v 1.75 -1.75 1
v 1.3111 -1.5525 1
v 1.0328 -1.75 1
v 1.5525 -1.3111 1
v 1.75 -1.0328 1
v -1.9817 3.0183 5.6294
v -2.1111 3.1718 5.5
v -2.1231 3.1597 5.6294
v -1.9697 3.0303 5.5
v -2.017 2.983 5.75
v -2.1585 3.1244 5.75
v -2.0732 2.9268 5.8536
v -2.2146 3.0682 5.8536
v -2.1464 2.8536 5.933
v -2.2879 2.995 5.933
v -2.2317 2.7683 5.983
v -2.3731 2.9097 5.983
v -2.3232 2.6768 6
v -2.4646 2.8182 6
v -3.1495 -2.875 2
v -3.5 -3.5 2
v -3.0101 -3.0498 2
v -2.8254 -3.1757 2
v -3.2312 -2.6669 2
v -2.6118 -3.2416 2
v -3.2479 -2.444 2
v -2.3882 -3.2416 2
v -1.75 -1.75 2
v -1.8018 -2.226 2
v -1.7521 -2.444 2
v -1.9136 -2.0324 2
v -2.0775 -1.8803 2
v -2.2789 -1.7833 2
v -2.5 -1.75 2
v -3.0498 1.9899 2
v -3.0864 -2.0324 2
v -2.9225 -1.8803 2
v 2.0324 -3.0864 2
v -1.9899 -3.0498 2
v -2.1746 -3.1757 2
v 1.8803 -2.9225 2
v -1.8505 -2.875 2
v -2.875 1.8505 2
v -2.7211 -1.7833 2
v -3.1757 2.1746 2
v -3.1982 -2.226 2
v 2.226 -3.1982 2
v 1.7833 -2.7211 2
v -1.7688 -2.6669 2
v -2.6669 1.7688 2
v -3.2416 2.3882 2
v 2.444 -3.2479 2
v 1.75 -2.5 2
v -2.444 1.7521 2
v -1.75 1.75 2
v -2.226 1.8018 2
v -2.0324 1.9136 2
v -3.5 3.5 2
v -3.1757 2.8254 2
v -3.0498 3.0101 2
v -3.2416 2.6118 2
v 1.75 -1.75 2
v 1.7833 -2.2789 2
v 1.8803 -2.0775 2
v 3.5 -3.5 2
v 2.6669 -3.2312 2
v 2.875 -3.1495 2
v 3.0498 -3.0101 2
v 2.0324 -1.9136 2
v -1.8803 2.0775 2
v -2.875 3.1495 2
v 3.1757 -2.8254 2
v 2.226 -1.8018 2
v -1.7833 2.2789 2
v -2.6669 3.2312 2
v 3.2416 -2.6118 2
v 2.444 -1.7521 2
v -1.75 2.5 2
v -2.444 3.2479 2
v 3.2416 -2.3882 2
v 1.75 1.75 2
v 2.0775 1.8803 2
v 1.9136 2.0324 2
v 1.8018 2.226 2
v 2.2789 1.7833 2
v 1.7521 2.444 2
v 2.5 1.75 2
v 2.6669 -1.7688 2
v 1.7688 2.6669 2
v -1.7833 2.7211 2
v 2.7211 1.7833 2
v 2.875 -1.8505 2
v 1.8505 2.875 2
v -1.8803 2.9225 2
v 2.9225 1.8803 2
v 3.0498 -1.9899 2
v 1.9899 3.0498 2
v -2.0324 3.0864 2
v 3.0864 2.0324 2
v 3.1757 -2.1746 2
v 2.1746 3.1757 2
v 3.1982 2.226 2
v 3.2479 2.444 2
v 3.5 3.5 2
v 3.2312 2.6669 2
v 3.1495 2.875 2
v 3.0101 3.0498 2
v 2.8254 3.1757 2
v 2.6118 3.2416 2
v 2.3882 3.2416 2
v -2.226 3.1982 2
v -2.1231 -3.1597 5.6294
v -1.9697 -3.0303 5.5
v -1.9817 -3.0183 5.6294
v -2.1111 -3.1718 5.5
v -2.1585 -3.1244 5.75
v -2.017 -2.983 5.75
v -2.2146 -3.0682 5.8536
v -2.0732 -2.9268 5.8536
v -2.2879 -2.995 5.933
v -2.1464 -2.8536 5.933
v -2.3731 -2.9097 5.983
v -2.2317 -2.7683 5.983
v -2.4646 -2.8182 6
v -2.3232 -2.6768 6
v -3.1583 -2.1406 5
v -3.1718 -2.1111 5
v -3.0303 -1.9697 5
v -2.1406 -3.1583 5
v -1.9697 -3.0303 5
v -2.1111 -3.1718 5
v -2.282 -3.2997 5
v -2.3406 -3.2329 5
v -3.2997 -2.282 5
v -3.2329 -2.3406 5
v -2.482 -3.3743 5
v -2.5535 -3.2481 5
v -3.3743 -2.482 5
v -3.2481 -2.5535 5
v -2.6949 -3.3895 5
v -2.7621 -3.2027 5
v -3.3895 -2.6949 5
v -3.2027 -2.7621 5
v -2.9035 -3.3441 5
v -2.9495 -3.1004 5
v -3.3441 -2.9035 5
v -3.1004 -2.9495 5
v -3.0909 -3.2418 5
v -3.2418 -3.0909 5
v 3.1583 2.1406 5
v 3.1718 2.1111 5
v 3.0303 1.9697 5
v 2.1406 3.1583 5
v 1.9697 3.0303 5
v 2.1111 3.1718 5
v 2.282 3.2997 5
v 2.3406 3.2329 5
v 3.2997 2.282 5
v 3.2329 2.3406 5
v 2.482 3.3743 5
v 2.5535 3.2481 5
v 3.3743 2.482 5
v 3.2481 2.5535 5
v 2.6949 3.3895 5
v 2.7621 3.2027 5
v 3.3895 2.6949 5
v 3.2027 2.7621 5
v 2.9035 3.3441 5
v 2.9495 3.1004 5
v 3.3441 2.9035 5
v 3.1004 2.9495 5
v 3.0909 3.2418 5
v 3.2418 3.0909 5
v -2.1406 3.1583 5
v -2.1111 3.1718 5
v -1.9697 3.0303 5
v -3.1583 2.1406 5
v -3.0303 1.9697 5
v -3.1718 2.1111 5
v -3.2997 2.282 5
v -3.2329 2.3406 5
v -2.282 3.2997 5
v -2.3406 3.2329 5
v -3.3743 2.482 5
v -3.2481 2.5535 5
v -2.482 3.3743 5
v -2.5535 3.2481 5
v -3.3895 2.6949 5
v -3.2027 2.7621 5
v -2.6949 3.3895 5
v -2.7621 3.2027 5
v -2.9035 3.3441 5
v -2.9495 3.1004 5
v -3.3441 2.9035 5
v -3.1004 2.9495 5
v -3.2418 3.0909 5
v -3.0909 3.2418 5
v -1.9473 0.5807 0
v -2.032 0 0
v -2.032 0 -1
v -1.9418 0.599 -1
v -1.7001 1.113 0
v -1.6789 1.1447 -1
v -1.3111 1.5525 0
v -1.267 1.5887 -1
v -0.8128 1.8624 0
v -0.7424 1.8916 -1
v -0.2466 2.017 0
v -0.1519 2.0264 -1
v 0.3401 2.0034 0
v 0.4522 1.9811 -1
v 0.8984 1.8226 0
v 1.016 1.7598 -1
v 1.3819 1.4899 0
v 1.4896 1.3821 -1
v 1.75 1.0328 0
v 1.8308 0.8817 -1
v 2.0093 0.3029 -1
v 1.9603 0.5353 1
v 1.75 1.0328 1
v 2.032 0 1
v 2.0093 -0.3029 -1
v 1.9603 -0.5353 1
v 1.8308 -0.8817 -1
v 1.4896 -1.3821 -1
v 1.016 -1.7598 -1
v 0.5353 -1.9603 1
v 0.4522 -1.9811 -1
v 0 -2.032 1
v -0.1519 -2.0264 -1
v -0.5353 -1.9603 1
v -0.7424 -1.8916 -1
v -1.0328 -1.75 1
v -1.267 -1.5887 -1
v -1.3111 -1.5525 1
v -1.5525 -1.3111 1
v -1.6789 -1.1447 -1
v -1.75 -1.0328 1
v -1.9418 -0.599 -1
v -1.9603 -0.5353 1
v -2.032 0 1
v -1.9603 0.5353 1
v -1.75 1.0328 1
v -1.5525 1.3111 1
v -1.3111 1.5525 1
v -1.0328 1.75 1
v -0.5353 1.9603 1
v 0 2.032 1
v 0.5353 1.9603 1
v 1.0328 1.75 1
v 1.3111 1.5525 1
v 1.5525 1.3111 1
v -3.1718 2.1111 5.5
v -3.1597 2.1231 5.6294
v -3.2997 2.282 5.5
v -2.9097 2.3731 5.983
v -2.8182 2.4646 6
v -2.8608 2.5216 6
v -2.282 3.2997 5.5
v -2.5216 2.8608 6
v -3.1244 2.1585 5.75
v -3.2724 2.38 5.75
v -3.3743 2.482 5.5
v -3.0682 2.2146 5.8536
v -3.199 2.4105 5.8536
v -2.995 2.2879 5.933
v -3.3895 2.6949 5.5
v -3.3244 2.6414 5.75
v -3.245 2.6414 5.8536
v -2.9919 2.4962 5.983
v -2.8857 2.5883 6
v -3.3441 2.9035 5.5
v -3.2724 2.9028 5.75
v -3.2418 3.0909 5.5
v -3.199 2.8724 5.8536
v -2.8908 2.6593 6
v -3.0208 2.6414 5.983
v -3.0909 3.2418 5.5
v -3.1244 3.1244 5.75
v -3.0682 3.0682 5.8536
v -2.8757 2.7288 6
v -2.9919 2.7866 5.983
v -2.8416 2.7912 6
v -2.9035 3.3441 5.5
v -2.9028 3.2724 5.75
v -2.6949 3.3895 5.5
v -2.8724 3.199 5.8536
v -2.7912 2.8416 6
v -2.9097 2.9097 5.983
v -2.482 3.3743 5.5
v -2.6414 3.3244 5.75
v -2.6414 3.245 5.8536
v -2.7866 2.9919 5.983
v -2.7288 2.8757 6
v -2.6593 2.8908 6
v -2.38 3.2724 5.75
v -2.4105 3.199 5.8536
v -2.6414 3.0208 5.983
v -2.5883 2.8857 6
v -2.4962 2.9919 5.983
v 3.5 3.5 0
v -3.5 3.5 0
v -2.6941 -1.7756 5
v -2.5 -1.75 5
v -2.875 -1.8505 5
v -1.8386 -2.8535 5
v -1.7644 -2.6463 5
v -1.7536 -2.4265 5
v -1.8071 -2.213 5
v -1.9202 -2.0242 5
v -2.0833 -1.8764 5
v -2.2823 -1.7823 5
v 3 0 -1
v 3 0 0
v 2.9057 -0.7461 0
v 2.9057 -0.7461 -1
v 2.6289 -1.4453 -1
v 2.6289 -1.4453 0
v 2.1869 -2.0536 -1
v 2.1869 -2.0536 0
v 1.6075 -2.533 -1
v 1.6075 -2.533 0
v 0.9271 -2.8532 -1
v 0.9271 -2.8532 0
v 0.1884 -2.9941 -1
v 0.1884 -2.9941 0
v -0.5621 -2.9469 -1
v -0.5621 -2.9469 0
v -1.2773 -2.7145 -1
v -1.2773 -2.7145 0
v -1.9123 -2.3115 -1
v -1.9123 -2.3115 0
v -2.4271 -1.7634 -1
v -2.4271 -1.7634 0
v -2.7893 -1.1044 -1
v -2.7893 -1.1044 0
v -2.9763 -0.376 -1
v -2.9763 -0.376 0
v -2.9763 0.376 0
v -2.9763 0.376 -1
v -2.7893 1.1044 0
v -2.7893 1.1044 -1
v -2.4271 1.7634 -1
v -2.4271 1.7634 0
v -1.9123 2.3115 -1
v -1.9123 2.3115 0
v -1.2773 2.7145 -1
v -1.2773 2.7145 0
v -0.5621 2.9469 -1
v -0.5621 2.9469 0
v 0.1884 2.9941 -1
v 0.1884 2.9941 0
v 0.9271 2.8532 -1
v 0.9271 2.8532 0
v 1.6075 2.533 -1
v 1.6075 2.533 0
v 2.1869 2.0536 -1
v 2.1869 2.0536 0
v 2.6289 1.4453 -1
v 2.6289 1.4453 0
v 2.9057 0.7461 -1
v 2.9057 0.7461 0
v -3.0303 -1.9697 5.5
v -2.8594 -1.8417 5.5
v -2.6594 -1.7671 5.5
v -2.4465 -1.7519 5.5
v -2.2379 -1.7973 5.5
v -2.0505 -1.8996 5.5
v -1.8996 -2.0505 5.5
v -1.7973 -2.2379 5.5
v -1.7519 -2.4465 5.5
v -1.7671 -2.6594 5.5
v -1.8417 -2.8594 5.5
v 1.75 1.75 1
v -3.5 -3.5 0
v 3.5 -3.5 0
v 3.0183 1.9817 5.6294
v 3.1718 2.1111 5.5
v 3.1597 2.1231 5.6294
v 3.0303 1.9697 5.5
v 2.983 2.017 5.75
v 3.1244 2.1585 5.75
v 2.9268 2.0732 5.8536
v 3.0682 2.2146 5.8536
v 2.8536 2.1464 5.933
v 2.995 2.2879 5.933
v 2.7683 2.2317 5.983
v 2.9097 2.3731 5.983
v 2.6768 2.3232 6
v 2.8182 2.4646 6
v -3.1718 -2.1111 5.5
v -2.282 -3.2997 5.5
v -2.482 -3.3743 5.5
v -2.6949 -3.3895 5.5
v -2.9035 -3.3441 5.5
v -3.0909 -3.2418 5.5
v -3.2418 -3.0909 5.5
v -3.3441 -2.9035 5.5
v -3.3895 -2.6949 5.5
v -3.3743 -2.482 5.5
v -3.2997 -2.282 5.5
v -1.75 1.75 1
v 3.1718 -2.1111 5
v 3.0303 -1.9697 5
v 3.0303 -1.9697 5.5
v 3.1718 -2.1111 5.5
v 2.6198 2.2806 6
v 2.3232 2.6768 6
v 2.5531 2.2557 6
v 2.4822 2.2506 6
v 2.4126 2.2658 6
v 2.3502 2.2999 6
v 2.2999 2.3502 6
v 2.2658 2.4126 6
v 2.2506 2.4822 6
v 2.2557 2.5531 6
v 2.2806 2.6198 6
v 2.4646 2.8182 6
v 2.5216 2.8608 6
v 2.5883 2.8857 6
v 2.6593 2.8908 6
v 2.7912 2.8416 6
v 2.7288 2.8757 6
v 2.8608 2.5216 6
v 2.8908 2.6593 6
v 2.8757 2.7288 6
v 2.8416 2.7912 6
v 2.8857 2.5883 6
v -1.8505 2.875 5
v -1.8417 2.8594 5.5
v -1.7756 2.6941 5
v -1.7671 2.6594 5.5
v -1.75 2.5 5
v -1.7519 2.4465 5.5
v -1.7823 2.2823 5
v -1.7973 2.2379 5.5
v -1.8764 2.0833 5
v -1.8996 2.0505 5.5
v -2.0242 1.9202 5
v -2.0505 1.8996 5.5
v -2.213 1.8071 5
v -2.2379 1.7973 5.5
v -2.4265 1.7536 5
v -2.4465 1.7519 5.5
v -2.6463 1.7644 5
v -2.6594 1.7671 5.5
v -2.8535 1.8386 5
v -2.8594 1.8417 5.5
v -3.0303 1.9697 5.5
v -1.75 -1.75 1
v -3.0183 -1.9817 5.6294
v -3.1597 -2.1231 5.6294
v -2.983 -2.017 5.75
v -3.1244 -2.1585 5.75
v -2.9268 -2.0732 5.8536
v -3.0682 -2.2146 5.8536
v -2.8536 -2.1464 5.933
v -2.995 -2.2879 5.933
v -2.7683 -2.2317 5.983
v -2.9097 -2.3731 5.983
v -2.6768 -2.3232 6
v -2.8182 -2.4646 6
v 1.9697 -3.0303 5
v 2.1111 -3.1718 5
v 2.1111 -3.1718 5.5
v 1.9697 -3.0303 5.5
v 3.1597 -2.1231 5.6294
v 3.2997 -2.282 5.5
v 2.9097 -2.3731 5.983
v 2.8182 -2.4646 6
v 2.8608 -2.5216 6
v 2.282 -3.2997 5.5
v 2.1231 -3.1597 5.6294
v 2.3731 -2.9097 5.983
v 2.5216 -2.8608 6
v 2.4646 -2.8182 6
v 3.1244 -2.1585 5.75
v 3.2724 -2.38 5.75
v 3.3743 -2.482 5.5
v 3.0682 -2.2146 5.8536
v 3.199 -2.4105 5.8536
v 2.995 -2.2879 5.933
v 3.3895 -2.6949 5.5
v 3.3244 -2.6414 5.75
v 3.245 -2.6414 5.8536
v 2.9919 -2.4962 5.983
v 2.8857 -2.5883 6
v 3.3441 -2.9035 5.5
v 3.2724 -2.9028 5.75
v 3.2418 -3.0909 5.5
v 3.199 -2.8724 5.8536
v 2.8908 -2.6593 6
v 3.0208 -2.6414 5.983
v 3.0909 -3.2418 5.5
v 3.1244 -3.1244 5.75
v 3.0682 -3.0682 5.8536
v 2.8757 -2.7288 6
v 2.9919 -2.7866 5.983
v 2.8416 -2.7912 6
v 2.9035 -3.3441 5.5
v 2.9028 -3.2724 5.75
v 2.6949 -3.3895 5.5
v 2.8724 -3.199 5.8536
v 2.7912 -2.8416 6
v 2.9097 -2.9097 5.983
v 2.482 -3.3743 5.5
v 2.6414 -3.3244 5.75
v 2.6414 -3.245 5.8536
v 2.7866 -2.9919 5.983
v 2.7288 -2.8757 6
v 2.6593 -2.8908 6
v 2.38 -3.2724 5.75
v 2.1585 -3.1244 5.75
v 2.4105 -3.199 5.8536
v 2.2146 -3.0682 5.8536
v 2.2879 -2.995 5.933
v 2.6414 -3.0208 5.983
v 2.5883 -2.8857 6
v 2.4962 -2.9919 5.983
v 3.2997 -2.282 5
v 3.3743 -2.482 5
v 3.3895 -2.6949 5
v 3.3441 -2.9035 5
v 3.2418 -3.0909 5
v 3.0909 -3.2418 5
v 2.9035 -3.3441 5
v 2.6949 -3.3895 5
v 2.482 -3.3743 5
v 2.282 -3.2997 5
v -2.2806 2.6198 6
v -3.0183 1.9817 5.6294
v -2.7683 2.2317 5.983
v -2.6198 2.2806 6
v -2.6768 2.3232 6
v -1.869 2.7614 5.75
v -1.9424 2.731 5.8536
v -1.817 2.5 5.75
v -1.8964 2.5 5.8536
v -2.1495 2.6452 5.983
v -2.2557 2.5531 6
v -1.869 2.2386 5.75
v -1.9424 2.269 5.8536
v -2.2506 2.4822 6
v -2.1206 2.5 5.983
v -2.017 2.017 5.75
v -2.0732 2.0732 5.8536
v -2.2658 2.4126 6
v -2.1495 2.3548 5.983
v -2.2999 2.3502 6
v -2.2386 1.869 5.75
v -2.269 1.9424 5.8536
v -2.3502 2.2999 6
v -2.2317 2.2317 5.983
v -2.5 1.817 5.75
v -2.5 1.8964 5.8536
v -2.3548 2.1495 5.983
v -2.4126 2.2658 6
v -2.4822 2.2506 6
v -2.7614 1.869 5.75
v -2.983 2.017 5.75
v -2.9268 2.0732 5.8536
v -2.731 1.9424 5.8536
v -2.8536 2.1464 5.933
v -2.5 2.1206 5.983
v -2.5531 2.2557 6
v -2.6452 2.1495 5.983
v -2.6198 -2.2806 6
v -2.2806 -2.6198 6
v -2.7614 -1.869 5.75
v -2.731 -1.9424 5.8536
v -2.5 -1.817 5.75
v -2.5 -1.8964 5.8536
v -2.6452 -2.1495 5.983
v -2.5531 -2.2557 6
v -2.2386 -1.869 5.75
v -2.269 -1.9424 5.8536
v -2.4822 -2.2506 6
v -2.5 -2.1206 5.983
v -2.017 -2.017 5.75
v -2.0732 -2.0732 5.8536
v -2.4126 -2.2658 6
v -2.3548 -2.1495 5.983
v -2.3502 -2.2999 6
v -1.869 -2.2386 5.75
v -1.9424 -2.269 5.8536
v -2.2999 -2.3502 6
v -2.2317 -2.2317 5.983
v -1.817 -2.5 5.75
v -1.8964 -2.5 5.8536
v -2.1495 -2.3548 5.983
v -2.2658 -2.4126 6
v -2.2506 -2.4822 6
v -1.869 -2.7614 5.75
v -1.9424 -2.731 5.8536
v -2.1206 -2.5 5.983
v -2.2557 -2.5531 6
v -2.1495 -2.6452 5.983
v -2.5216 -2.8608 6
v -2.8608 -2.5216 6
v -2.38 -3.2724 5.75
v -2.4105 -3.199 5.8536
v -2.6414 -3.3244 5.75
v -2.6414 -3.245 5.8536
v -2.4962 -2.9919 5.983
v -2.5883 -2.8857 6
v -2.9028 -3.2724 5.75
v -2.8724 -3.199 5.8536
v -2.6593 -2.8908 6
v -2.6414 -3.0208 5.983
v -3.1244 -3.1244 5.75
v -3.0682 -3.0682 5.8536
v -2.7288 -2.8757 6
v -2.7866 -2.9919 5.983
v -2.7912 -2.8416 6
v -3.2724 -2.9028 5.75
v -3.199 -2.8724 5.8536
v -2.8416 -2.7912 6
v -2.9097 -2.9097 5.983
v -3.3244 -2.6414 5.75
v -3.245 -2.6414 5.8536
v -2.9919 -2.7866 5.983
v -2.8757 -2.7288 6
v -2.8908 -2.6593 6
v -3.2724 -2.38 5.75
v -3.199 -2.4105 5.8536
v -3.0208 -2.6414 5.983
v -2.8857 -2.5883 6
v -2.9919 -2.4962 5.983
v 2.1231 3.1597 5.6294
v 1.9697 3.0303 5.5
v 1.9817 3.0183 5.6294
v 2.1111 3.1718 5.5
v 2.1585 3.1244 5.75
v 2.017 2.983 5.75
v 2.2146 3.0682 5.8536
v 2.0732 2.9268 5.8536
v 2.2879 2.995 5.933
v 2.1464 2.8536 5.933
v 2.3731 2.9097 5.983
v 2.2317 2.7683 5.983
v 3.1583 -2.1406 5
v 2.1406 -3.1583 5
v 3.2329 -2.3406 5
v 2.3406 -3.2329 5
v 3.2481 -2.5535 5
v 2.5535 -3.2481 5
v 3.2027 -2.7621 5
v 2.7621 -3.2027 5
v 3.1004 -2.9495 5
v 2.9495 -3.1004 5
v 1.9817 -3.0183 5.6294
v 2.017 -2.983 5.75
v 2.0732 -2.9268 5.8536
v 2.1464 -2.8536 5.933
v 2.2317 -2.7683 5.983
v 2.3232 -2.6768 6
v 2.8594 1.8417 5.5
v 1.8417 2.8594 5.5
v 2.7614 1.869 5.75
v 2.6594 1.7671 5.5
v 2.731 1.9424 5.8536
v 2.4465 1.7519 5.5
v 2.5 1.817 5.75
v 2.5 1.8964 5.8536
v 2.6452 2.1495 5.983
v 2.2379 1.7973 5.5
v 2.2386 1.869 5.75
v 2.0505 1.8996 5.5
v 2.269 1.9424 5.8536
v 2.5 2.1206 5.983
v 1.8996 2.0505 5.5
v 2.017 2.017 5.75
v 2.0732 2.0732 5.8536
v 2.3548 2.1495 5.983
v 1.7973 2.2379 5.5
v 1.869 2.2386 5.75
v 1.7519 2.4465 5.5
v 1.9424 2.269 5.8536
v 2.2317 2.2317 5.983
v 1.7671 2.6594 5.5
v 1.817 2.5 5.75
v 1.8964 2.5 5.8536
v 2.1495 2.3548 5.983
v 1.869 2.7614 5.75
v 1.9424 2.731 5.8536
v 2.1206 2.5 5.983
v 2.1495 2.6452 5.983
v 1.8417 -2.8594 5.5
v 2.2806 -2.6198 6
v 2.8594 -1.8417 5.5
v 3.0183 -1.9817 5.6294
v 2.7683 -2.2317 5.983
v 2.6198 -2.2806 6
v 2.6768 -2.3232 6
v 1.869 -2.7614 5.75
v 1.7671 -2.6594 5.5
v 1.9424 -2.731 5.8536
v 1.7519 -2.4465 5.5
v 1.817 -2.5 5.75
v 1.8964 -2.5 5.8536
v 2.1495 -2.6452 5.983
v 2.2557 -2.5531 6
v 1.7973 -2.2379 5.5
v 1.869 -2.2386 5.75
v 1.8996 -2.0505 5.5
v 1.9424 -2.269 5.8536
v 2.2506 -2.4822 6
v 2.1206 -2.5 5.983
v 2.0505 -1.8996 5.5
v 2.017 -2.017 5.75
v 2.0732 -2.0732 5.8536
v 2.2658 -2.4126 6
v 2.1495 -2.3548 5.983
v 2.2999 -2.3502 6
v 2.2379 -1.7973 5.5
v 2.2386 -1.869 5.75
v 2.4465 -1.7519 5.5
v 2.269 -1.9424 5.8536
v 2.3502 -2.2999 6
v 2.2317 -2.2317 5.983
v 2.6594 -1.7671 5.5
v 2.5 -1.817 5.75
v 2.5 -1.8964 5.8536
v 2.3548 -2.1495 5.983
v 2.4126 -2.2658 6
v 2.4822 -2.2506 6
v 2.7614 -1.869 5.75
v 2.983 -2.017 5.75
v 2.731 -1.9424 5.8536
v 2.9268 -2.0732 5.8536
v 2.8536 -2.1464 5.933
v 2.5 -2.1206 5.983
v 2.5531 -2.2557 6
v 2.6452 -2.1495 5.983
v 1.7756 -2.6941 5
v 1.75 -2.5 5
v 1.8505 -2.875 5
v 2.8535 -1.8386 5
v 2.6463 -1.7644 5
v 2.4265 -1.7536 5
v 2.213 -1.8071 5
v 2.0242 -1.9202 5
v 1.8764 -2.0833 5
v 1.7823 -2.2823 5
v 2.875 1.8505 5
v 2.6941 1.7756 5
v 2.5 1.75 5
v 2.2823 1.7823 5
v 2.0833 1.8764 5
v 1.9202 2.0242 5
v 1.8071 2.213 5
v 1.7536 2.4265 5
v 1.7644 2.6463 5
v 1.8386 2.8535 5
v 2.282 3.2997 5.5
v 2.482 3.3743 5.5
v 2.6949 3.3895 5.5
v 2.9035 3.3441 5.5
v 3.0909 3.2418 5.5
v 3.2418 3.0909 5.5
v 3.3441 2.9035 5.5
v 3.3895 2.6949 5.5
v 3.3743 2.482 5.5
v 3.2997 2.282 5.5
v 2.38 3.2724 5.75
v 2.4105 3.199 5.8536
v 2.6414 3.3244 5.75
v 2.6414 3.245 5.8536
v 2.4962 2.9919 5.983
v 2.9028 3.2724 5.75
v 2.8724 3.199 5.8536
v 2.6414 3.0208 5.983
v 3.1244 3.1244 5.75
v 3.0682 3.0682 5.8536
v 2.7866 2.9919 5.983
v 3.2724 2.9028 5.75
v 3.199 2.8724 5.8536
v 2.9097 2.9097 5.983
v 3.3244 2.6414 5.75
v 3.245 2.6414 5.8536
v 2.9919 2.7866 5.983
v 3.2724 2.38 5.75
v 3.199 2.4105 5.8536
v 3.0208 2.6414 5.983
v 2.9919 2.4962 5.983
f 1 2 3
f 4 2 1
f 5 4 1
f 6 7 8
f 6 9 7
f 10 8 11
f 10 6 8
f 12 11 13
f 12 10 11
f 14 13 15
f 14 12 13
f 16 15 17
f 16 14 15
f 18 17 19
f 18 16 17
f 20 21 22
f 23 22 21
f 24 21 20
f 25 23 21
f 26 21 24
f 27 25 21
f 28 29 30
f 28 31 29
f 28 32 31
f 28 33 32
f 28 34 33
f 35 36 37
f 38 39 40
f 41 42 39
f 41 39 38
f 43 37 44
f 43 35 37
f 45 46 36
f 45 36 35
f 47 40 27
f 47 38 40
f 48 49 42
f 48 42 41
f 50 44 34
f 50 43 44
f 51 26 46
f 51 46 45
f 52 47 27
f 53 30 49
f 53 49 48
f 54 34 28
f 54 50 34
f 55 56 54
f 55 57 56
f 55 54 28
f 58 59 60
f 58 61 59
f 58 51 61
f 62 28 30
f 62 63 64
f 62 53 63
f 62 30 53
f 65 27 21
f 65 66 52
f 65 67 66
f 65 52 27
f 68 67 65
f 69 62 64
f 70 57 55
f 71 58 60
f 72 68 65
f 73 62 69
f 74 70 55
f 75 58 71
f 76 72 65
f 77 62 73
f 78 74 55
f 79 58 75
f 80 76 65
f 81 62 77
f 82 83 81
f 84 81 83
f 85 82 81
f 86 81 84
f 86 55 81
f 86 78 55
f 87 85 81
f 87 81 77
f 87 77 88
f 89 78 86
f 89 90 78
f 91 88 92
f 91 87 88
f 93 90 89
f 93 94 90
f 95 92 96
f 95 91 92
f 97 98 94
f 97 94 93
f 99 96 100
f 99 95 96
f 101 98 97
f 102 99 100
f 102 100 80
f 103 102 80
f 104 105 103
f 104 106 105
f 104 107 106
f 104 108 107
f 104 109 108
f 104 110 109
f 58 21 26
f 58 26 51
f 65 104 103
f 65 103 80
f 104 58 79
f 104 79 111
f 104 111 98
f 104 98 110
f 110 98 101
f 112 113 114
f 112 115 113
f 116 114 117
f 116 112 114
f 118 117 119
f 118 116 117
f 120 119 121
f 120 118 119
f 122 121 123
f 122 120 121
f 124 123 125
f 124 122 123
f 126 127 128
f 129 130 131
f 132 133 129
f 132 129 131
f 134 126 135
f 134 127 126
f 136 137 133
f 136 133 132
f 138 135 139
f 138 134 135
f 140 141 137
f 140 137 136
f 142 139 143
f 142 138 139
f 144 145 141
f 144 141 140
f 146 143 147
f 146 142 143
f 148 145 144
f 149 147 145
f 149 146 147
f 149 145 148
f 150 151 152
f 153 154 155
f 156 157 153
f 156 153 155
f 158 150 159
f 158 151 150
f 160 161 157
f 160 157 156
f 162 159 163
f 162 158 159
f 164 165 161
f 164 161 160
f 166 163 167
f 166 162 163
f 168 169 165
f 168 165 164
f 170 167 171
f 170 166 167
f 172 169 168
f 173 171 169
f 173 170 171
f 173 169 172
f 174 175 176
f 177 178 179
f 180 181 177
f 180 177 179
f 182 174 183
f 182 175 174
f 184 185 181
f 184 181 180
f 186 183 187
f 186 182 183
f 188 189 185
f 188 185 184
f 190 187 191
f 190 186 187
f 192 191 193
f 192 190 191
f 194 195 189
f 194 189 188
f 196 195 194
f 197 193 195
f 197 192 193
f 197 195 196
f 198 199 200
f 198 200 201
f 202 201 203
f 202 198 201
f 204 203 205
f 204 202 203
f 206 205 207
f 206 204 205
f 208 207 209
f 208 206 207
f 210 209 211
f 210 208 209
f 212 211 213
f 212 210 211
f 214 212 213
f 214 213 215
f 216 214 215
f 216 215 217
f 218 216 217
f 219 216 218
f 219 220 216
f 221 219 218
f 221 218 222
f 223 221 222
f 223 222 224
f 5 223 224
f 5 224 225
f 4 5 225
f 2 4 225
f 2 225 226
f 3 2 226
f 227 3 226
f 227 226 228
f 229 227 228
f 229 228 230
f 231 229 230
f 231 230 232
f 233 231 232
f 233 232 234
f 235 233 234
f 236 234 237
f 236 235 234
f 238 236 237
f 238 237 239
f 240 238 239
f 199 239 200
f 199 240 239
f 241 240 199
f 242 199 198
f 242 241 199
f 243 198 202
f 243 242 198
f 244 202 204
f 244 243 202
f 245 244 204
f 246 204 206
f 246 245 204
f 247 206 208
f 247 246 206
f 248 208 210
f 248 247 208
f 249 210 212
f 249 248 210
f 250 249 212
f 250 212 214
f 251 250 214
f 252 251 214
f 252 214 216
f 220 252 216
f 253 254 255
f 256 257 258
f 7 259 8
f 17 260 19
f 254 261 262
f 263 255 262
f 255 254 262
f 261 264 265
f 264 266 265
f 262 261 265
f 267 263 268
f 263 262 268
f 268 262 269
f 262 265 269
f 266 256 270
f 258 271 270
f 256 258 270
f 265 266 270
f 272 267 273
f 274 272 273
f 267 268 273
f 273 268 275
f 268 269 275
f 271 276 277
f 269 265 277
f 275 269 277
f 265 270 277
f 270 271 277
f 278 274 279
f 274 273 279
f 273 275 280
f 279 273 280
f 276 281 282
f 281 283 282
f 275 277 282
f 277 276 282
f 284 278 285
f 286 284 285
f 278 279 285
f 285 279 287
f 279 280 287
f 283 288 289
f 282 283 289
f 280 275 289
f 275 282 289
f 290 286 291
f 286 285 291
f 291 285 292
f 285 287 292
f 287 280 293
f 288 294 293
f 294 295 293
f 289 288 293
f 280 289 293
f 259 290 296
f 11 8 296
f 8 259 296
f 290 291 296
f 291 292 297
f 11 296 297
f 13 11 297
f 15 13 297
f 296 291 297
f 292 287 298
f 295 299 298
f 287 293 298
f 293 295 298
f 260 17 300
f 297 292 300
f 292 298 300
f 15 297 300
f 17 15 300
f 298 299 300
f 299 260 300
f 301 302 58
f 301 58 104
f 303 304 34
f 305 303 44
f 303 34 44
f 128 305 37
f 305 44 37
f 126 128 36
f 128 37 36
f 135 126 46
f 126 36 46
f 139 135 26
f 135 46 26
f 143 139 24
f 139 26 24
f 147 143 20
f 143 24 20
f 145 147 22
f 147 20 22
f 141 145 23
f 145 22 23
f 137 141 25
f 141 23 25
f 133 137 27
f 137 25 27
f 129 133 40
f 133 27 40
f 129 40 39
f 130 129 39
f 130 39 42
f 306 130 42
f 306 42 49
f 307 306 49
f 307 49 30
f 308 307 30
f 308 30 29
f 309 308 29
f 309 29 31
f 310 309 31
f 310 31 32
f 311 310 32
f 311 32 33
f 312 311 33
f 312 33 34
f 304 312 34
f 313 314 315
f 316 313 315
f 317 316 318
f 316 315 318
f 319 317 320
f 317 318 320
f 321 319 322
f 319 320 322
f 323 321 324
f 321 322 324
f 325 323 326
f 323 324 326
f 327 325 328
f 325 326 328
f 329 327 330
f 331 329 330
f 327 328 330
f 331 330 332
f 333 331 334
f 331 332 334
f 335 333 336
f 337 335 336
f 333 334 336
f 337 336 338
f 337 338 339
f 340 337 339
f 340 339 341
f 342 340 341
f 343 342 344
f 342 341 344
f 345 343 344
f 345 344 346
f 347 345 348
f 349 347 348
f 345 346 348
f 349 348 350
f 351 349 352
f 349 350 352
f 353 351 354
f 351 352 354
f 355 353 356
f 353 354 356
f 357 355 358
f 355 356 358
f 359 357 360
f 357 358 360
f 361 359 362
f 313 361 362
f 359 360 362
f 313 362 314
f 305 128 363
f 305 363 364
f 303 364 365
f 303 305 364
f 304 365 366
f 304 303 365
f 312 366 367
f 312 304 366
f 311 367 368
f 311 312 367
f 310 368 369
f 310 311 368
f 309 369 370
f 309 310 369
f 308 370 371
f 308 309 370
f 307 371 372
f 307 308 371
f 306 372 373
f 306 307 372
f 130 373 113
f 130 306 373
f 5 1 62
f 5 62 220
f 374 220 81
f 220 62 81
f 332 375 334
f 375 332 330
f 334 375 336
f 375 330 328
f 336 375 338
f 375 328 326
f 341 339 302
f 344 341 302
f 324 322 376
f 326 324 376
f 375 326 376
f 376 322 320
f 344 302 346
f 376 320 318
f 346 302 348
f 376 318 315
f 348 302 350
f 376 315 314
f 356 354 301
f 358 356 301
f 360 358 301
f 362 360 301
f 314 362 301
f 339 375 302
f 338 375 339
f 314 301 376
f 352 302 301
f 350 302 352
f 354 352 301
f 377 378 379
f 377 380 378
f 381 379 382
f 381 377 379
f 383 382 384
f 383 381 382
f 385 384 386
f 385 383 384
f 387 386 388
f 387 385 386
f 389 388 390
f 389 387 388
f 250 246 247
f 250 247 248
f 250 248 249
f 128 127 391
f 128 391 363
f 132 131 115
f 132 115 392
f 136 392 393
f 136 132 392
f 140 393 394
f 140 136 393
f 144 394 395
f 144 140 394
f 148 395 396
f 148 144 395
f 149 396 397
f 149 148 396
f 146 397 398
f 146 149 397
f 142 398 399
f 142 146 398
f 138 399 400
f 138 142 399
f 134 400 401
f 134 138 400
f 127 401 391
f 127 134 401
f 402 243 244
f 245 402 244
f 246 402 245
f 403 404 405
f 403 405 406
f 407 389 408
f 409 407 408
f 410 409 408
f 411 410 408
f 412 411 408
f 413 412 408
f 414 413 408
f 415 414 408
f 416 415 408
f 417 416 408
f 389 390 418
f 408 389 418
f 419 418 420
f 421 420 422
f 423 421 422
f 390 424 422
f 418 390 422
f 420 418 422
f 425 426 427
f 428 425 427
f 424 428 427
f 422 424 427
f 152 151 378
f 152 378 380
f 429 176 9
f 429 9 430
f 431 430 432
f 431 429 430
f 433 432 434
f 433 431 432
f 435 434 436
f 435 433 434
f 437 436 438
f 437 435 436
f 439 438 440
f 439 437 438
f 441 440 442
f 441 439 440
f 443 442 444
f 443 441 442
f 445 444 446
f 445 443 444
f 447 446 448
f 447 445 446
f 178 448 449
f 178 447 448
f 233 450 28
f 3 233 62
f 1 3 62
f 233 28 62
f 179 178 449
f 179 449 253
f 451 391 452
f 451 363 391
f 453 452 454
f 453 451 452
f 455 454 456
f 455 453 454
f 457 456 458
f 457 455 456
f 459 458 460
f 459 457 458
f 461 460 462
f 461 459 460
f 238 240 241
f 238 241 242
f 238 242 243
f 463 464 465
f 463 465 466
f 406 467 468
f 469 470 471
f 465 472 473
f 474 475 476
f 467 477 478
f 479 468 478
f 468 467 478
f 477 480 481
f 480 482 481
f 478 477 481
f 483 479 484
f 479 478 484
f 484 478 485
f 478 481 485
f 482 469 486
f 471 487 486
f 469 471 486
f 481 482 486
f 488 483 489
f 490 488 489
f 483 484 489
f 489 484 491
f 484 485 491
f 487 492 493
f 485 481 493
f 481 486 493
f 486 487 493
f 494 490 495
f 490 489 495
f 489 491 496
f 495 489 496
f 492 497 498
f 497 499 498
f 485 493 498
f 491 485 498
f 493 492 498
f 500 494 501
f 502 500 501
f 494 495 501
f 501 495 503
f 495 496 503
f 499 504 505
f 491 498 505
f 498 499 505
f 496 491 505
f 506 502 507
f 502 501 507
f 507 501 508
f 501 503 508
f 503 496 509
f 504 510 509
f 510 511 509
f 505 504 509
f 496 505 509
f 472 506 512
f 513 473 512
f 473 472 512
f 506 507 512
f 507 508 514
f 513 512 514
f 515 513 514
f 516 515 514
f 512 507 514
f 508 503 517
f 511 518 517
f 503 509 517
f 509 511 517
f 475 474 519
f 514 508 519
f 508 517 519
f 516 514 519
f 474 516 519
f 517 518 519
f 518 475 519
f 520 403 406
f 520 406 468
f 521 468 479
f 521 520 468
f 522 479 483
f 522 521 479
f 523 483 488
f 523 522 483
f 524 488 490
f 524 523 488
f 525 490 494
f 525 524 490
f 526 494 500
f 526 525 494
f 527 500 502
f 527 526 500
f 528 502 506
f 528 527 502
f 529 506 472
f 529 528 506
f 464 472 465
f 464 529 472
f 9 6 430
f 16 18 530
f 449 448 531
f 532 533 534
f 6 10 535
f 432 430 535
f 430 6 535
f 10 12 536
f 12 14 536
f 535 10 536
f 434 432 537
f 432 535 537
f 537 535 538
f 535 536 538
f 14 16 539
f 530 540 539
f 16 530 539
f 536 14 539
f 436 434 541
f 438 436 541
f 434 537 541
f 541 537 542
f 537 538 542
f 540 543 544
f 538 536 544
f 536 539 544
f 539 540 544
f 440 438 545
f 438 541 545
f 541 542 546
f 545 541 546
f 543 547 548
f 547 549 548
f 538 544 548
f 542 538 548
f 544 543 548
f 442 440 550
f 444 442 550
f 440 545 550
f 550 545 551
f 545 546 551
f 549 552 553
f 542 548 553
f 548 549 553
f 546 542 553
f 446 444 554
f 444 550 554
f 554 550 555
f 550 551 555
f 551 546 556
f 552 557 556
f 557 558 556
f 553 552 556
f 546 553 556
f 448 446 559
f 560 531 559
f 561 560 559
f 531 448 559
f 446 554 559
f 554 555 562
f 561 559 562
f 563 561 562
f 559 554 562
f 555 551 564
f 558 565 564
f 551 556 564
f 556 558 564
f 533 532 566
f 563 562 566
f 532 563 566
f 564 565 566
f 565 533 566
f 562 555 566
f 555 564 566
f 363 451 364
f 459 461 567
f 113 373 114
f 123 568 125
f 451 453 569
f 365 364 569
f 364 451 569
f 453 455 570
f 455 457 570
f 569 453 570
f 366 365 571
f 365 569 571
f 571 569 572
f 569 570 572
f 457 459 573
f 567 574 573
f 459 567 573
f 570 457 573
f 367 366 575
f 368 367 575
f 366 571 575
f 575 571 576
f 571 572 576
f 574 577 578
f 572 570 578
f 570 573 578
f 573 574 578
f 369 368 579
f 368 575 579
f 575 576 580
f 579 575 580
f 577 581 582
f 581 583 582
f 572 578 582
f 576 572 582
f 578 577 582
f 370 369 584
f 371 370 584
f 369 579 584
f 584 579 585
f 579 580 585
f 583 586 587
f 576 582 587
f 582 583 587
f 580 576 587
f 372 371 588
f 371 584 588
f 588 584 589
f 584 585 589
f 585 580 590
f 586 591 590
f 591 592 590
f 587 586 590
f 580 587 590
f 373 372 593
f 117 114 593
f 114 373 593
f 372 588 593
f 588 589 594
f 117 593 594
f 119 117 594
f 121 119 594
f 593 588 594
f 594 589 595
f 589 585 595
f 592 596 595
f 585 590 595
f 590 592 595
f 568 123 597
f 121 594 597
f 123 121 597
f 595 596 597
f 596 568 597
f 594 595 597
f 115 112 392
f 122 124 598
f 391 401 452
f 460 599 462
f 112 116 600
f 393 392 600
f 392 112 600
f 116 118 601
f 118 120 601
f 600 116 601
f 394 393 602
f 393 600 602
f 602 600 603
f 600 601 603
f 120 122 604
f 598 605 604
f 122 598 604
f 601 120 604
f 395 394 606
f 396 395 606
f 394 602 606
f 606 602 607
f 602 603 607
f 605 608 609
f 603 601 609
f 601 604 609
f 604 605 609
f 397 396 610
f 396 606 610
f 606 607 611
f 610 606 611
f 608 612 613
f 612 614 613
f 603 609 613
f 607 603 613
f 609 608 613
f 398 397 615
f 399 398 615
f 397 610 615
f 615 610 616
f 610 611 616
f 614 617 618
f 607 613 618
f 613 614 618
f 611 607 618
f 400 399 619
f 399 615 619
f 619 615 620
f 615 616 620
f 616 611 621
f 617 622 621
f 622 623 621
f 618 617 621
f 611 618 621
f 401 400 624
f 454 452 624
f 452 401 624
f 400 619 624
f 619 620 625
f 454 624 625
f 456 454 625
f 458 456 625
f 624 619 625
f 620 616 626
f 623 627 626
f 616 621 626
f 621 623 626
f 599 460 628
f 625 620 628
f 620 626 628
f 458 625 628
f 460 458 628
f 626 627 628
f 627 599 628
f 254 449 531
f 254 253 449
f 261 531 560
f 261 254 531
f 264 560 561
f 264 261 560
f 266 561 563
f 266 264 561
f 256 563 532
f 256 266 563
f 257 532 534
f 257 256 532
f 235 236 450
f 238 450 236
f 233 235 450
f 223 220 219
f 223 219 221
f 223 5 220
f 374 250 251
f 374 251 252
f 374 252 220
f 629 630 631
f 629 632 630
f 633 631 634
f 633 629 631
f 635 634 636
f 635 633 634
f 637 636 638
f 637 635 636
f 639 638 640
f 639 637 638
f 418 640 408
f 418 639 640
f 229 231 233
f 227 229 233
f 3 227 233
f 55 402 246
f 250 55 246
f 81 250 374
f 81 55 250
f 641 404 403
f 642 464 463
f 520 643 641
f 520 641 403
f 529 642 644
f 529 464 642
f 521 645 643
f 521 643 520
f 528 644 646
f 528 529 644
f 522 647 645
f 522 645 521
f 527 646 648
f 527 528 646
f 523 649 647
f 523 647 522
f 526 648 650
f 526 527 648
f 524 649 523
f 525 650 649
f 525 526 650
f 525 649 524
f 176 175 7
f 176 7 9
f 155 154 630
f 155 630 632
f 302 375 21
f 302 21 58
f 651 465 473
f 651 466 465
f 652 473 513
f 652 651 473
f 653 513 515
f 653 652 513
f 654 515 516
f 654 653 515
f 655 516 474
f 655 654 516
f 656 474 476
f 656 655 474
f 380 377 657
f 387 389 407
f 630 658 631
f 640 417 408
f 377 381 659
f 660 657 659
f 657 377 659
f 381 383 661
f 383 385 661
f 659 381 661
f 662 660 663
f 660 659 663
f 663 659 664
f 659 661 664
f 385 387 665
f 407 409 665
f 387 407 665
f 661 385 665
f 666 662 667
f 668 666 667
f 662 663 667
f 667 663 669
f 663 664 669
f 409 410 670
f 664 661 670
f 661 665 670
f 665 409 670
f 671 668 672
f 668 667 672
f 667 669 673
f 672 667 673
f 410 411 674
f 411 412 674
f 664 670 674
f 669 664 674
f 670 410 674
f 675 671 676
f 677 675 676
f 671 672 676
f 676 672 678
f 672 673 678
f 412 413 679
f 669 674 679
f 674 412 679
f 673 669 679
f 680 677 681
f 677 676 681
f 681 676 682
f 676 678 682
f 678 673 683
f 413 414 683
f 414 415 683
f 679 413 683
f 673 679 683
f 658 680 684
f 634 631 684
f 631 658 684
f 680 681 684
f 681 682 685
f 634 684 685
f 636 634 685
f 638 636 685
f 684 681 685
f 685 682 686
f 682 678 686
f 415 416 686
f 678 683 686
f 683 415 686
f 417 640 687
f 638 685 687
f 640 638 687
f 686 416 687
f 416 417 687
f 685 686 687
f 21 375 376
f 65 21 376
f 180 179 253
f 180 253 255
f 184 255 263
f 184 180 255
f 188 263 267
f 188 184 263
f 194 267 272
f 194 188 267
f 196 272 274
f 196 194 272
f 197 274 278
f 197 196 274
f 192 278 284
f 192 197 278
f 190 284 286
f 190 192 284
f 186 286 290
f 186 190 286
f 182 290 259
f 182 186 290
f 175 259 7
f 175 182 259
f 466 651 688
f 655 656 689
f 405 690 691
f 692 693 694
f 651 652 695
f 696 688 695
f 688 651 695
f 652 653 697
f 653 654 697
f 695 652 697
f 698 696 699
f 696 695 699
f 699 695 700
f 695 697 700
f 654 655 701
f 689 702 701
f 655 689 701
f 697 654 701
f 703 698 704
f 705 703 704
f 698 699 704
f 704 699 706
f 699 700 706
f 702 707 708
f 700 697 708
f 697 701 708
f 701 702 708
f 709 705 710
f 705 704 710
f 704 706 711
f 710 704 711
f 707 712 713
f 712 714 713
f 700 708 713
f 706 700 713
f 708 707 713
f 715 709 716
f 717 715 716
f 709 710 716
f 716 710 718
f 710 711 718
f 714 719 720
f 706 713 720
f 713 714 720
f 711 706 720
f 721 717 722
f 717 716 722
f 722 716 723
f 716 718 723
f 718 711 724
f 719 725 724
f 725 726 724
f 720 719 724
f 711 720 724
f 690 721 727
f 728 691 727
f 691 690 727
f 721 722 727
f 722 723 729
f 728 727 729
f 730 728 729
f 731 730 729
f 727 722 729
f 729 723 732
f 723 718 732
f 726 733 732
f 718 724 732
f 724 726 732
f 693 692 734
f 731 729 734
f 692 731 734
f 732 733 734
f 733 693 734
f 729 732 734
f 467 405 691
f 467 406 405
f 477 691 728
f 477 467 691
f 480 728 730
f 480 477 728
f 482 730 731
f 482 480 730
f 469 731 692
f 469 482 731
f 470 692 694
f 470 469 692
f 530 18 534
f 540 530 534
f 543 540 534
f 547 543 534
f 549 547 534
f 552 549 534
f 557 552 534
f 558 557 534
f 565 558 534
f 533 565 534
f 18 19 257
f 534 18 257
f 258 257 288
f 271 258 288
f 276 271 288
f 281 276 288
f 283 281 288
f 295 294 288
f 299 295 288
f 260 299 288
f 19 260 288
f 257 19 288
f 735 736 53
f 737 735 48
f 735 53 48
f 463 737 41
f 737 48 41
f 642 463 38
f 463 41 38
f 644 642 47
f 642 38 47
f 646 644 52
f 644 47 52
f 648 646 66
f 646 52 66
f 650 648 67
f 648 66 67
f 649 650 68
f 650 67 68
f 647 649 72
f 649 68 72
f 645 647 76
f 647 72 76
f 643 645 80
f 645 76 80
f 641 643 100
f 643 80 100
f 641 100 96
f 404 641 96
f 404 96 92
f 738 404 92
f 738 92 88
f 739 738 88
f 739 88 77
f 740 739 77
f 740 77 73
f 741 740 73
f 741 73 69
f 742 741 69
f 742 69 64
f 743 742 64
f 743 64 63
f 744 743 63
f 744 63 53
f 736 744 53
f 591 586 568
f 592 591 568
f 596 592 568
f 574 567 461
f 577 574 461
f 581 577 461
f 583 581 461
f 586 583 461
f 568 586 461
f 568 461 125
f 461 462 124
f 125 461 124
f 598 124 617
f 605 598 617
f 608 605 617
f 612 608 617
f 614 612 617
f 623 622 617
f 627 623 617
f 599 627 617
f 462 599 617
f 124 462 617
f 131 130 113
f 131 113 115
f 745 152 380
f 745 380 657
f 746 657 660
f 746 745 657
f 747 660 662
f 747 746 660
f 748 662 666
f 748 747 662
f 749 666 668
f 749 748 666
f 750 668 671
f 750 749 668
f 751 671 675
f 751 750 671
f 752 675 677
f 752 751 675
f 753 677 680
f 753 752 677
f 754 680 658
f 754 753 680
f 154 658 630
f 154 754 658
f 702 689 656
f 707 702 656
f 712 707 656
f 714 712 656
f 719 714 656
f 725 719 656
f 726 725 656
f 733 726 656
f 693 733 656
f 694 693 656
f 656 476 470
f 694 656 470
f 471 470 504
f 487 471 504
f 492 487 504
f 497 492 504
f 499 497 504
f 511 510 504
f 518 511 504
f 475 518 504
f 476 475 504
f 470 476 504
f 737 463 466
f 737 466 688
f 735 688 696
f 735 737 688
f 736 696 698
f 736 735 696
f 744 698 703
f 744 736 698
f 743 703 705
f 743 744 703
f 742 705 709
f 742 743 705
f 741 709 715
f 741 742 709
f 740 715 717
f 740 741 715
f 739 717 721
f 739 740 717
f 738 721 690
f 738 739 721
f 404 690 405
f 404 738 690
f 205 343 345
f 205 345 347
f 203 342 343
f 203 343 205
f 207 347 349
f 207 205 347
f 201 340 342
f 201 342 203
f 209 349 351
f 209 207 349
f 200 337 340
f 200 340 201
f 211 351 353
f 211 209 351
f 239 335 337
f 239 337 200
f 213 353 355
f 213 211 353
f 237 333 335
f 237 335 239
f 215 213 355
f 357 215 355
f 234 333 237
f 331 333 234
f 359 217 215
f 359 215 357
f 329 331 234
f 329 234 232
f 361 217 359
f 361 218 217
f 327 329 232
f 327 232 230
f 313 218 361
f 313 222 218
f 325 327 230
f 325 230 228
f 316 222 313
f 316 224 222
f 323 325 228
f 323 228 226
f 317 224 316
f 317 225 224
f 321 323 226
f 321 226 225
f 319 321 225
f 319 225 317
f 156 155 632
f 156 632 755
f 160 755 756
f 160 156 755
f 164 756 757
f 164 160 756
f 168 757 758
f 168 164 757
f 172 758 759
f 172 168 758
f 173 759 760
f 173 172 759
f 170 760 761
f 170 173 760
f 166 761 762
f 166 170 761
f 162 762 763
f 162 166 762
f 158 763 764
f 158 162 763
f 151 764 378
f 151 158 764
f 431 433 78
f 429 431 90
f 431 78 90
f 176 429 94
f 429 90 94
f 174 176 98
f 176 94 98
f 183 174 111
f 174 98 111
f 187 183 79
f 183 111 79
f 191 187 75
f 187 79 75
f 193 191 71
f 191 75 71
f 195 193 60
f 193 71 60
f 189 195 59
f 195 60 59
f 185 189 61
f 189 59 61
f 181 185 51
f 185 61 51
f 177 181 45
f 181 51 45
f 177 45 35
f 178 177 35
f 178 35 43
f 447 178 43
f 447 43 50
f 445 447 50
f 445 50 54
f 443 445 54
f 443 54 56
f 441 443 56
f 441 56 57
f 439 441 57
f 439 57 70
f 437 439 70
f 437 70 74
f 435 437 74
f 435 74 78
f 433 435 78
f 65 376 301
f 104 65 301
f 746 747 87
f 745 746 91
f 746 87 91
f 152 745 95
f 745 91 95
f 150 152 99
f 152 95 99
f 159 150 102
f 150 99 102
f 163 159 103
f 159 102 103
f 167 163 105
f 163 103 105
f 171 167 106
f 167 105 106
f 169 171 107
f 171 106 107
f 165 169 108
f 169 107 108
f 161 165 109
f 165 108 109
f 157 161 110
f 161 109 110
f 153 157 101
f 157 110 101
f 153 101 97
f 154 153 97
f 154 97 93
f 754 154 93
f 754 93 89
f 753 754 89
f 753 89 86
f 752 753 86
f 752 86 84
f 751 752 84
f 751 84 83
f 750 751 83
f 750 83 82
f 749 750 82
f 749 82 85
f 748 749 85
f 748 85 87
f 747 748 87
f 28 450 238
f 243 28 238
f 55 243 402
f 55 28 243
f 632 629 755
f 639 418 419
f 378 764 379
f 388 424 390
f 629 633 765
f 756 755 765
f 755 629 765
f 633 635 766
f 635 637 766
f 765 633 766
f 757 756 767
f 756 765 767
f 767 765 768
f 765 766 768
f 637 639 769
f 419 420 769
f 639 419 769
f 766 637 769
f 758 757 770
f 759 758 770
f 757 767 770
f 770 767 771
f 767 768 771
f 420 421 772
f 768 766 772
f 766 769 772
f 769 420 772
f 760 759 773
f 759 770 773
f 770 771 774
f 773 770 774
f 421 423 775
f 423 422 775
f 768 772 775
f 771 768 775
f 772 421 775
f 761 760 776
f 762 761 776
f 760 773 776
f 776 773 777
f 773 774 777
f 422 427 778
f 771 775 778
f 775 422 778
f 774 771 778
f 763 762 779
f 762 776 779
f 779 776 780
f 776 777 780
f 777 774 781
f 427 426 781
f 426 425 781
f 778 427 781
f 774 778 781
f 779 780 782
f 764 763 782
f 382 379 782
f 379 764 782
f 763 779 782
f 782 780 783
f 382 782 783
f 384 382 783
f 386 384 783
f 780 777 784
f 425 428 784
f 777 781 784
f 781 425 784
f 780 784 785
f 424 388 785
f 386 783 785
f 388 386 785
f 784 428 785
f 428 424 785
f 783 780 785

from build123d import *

# Parameters (mm, degrees)
ESQUISSE1_W                        = 7
ESQUISSE1_H                        = 7
BOSS_EXTRU_1_DEPTH                 = 2
ESQUISSE2_R                        = 3
ESQUISSE2_R_2                      = 2.032039
BOSS_EXTRU_2_DEPTH                 = 1
ESQUISSE3_R                        = 0.75
BOSS_EXTRU_3_DEPTH                 = 3
BOSS_EXTRU_4_DEPTH                 = 1
CONG_1_R                           = 0.5
R_P_TITION_CIRCULAIRE2_COUNT       = 4
CONG_1_OF_R_P_TITION_CIRCULAIRE2_R = 0.5
ESQUISSE6_W                        = 3.5
ESQUISSE6_H                        = 3.5
ENL_V_MAT_EXTRU_1_DEPTH            = 1
ENL_V_START                        = -1
ESQUISSE7_R                        = 2.032039
ENL_V_MAT_EXTRU_2_DEPTH            = 1


with BuildPart() as part:
    # Esquisse1 → Boss.-Extru.1 (new body)
    with BuildSketch(Plane.XY):
        Rectangle(ESQUISSE1_W, ESQUISSE1_H)
    extrude(amount=BOSS_EXTRU_1_DEPTH)

    # Esquisse2 → Boss.-Extru.2 (add)
    with BuildSketch(Plane(origin=(0, 0, 0), x_dir=(-1, 0, 0), z_dir=(0, 0, -1))):
        with Locations(Location((0, 0, 0), (0, 0, 180))):
            Circle(ESQUISSE2_R)
        Circle(ESQUISSE2_R_2, mode=Mode.SUBTRACT)
    extrude(amount=BOSS_EXTRU_2_DEPTH)

    # Esquisse3 → Boss.-Extru.3 (add)
    with BuildSketch(Plane(origin=(-0.00837, -0.443983, 2), x_dir=(1, 0, 0), z_dir=(0, 0, 1))):
        with Locations((-2.49163, 2.943983)):
            Circle(ESQUISSE3_R)
    boss_extru_3 = extrude(amount=BOSS_EXTRU_3_DEPTH)

    # Esquisse5 → Boss.-Extru.4 (add)
    with BuildSketch(Plane.XY.offset(5)):
        with BuildLine():
            Line((-3.03033, 1.96967), (-3.171751, 2.111091))
            ThreePointArc((-3.171751, 2.111091), (-3.171751, 3.171751), (-2.111091, 3.171751))
            Line((-2.111091, 3.171751), (-1.96967, 3.03033))
            ThreePointArc((-1.96967, 3.03033), (-1.96967, 1.96967), (-3.03033, 1.96967))
        make_face()
    boss_extru_4 = extrude(amount=BOSS_EXTRU_4_DEPTH)

    # Congé1
    cong_1_edges = [part.edges().sort_by_distance(p)[0] for p in [
        (-1.96967, 1.96967, 6),
        (-2.040381, 3.101041, 6),
        (-3.171751, 3.171751, 6),
        (-3.101041, 2.040381, 6),
    ]]
    fillet(cong_1_edges, radius=CONG_1_R)

    # Répétition circulaire2: Boss.-Extru.3, Boss.-Extru.4 ×4 about axis
    r_p_tition_circulaire2_axis = Axis((0, 0, 0), (0, 0, 1))
    add([boss_extru_3.rotate(r_p_tition_circulaire2_axis, i * 360 / R_P_TITION_CIRCULAIRE2_COUNT) for i in range(1, R_P_TITION_CIRCULAIRE2_COUNT)])
    add([boss_extru_4.rotate(r_p_tition_circulaire2_axis, i * 360 / R_P_TITION_CIRCULAIRE2_COUNT) for i in range(1, R_P_TITION_CIRCULAIRE2_COUNT)])

    # Congé1 of Répétition circulaire2
    cong_1_of_r_p_tition_circulaire2_edges = [part.edges().sort_by_distance(p)[0] for p in [
        (-1.96967, -1.96967, 6),
        (-3.101041, -2.040381, 6),
        (-3.171751, -3.171751, 6),
        (-2.040381, -3.101041, 6),
        (1.96967, -1.96967, 6),
        (2.040381, -3.101041, 6),
        (3.171751, -3.171751, 6),
        (3.101041, -2.040381, 6),
        (1.96967, 1.96967, 6),
        (3.101041, 2.040381, 6),
        (3.171751, 3.171751, 6),
        (2.040381, 3.101041, 6),
    ]]
    fillet(cong_1_of_r_p_tition_circulaire2_edges, radius=CONG_1_OF_R_P_TITION_CIRCULAIRE2_R)

    # Esquisse6 → Enlèv. mat.-Extru.1 (cut)
    with BuildSketch(Plane.XY.offset(2)):
        Rectangle(ESQUISSE6_W, ESQUISSE6_H)
    extrude(amount=-ENL_V_MAT_EXTRU_1_DEPTH, mode=Mode.SUBTRACT)

    # Esquisse7 → Enlèv. mat.-Extru.2 (cut)
    with BuildSketch(Plane(origin=(0, 0, 0), x_dir=(-1, 0, 0), z_dir=(0, 0, -1)).offset(ENL_V_START)):
        with Locations(Location((0, 0, 0), (0, 0, 149.452052))):
            Circle(ESQUISSE7_R)
    extrude(amount=ENL_V_MAT_EXTRU_2_DEPTH, mode=Mode.SUBTRACT)


solid = part.part
